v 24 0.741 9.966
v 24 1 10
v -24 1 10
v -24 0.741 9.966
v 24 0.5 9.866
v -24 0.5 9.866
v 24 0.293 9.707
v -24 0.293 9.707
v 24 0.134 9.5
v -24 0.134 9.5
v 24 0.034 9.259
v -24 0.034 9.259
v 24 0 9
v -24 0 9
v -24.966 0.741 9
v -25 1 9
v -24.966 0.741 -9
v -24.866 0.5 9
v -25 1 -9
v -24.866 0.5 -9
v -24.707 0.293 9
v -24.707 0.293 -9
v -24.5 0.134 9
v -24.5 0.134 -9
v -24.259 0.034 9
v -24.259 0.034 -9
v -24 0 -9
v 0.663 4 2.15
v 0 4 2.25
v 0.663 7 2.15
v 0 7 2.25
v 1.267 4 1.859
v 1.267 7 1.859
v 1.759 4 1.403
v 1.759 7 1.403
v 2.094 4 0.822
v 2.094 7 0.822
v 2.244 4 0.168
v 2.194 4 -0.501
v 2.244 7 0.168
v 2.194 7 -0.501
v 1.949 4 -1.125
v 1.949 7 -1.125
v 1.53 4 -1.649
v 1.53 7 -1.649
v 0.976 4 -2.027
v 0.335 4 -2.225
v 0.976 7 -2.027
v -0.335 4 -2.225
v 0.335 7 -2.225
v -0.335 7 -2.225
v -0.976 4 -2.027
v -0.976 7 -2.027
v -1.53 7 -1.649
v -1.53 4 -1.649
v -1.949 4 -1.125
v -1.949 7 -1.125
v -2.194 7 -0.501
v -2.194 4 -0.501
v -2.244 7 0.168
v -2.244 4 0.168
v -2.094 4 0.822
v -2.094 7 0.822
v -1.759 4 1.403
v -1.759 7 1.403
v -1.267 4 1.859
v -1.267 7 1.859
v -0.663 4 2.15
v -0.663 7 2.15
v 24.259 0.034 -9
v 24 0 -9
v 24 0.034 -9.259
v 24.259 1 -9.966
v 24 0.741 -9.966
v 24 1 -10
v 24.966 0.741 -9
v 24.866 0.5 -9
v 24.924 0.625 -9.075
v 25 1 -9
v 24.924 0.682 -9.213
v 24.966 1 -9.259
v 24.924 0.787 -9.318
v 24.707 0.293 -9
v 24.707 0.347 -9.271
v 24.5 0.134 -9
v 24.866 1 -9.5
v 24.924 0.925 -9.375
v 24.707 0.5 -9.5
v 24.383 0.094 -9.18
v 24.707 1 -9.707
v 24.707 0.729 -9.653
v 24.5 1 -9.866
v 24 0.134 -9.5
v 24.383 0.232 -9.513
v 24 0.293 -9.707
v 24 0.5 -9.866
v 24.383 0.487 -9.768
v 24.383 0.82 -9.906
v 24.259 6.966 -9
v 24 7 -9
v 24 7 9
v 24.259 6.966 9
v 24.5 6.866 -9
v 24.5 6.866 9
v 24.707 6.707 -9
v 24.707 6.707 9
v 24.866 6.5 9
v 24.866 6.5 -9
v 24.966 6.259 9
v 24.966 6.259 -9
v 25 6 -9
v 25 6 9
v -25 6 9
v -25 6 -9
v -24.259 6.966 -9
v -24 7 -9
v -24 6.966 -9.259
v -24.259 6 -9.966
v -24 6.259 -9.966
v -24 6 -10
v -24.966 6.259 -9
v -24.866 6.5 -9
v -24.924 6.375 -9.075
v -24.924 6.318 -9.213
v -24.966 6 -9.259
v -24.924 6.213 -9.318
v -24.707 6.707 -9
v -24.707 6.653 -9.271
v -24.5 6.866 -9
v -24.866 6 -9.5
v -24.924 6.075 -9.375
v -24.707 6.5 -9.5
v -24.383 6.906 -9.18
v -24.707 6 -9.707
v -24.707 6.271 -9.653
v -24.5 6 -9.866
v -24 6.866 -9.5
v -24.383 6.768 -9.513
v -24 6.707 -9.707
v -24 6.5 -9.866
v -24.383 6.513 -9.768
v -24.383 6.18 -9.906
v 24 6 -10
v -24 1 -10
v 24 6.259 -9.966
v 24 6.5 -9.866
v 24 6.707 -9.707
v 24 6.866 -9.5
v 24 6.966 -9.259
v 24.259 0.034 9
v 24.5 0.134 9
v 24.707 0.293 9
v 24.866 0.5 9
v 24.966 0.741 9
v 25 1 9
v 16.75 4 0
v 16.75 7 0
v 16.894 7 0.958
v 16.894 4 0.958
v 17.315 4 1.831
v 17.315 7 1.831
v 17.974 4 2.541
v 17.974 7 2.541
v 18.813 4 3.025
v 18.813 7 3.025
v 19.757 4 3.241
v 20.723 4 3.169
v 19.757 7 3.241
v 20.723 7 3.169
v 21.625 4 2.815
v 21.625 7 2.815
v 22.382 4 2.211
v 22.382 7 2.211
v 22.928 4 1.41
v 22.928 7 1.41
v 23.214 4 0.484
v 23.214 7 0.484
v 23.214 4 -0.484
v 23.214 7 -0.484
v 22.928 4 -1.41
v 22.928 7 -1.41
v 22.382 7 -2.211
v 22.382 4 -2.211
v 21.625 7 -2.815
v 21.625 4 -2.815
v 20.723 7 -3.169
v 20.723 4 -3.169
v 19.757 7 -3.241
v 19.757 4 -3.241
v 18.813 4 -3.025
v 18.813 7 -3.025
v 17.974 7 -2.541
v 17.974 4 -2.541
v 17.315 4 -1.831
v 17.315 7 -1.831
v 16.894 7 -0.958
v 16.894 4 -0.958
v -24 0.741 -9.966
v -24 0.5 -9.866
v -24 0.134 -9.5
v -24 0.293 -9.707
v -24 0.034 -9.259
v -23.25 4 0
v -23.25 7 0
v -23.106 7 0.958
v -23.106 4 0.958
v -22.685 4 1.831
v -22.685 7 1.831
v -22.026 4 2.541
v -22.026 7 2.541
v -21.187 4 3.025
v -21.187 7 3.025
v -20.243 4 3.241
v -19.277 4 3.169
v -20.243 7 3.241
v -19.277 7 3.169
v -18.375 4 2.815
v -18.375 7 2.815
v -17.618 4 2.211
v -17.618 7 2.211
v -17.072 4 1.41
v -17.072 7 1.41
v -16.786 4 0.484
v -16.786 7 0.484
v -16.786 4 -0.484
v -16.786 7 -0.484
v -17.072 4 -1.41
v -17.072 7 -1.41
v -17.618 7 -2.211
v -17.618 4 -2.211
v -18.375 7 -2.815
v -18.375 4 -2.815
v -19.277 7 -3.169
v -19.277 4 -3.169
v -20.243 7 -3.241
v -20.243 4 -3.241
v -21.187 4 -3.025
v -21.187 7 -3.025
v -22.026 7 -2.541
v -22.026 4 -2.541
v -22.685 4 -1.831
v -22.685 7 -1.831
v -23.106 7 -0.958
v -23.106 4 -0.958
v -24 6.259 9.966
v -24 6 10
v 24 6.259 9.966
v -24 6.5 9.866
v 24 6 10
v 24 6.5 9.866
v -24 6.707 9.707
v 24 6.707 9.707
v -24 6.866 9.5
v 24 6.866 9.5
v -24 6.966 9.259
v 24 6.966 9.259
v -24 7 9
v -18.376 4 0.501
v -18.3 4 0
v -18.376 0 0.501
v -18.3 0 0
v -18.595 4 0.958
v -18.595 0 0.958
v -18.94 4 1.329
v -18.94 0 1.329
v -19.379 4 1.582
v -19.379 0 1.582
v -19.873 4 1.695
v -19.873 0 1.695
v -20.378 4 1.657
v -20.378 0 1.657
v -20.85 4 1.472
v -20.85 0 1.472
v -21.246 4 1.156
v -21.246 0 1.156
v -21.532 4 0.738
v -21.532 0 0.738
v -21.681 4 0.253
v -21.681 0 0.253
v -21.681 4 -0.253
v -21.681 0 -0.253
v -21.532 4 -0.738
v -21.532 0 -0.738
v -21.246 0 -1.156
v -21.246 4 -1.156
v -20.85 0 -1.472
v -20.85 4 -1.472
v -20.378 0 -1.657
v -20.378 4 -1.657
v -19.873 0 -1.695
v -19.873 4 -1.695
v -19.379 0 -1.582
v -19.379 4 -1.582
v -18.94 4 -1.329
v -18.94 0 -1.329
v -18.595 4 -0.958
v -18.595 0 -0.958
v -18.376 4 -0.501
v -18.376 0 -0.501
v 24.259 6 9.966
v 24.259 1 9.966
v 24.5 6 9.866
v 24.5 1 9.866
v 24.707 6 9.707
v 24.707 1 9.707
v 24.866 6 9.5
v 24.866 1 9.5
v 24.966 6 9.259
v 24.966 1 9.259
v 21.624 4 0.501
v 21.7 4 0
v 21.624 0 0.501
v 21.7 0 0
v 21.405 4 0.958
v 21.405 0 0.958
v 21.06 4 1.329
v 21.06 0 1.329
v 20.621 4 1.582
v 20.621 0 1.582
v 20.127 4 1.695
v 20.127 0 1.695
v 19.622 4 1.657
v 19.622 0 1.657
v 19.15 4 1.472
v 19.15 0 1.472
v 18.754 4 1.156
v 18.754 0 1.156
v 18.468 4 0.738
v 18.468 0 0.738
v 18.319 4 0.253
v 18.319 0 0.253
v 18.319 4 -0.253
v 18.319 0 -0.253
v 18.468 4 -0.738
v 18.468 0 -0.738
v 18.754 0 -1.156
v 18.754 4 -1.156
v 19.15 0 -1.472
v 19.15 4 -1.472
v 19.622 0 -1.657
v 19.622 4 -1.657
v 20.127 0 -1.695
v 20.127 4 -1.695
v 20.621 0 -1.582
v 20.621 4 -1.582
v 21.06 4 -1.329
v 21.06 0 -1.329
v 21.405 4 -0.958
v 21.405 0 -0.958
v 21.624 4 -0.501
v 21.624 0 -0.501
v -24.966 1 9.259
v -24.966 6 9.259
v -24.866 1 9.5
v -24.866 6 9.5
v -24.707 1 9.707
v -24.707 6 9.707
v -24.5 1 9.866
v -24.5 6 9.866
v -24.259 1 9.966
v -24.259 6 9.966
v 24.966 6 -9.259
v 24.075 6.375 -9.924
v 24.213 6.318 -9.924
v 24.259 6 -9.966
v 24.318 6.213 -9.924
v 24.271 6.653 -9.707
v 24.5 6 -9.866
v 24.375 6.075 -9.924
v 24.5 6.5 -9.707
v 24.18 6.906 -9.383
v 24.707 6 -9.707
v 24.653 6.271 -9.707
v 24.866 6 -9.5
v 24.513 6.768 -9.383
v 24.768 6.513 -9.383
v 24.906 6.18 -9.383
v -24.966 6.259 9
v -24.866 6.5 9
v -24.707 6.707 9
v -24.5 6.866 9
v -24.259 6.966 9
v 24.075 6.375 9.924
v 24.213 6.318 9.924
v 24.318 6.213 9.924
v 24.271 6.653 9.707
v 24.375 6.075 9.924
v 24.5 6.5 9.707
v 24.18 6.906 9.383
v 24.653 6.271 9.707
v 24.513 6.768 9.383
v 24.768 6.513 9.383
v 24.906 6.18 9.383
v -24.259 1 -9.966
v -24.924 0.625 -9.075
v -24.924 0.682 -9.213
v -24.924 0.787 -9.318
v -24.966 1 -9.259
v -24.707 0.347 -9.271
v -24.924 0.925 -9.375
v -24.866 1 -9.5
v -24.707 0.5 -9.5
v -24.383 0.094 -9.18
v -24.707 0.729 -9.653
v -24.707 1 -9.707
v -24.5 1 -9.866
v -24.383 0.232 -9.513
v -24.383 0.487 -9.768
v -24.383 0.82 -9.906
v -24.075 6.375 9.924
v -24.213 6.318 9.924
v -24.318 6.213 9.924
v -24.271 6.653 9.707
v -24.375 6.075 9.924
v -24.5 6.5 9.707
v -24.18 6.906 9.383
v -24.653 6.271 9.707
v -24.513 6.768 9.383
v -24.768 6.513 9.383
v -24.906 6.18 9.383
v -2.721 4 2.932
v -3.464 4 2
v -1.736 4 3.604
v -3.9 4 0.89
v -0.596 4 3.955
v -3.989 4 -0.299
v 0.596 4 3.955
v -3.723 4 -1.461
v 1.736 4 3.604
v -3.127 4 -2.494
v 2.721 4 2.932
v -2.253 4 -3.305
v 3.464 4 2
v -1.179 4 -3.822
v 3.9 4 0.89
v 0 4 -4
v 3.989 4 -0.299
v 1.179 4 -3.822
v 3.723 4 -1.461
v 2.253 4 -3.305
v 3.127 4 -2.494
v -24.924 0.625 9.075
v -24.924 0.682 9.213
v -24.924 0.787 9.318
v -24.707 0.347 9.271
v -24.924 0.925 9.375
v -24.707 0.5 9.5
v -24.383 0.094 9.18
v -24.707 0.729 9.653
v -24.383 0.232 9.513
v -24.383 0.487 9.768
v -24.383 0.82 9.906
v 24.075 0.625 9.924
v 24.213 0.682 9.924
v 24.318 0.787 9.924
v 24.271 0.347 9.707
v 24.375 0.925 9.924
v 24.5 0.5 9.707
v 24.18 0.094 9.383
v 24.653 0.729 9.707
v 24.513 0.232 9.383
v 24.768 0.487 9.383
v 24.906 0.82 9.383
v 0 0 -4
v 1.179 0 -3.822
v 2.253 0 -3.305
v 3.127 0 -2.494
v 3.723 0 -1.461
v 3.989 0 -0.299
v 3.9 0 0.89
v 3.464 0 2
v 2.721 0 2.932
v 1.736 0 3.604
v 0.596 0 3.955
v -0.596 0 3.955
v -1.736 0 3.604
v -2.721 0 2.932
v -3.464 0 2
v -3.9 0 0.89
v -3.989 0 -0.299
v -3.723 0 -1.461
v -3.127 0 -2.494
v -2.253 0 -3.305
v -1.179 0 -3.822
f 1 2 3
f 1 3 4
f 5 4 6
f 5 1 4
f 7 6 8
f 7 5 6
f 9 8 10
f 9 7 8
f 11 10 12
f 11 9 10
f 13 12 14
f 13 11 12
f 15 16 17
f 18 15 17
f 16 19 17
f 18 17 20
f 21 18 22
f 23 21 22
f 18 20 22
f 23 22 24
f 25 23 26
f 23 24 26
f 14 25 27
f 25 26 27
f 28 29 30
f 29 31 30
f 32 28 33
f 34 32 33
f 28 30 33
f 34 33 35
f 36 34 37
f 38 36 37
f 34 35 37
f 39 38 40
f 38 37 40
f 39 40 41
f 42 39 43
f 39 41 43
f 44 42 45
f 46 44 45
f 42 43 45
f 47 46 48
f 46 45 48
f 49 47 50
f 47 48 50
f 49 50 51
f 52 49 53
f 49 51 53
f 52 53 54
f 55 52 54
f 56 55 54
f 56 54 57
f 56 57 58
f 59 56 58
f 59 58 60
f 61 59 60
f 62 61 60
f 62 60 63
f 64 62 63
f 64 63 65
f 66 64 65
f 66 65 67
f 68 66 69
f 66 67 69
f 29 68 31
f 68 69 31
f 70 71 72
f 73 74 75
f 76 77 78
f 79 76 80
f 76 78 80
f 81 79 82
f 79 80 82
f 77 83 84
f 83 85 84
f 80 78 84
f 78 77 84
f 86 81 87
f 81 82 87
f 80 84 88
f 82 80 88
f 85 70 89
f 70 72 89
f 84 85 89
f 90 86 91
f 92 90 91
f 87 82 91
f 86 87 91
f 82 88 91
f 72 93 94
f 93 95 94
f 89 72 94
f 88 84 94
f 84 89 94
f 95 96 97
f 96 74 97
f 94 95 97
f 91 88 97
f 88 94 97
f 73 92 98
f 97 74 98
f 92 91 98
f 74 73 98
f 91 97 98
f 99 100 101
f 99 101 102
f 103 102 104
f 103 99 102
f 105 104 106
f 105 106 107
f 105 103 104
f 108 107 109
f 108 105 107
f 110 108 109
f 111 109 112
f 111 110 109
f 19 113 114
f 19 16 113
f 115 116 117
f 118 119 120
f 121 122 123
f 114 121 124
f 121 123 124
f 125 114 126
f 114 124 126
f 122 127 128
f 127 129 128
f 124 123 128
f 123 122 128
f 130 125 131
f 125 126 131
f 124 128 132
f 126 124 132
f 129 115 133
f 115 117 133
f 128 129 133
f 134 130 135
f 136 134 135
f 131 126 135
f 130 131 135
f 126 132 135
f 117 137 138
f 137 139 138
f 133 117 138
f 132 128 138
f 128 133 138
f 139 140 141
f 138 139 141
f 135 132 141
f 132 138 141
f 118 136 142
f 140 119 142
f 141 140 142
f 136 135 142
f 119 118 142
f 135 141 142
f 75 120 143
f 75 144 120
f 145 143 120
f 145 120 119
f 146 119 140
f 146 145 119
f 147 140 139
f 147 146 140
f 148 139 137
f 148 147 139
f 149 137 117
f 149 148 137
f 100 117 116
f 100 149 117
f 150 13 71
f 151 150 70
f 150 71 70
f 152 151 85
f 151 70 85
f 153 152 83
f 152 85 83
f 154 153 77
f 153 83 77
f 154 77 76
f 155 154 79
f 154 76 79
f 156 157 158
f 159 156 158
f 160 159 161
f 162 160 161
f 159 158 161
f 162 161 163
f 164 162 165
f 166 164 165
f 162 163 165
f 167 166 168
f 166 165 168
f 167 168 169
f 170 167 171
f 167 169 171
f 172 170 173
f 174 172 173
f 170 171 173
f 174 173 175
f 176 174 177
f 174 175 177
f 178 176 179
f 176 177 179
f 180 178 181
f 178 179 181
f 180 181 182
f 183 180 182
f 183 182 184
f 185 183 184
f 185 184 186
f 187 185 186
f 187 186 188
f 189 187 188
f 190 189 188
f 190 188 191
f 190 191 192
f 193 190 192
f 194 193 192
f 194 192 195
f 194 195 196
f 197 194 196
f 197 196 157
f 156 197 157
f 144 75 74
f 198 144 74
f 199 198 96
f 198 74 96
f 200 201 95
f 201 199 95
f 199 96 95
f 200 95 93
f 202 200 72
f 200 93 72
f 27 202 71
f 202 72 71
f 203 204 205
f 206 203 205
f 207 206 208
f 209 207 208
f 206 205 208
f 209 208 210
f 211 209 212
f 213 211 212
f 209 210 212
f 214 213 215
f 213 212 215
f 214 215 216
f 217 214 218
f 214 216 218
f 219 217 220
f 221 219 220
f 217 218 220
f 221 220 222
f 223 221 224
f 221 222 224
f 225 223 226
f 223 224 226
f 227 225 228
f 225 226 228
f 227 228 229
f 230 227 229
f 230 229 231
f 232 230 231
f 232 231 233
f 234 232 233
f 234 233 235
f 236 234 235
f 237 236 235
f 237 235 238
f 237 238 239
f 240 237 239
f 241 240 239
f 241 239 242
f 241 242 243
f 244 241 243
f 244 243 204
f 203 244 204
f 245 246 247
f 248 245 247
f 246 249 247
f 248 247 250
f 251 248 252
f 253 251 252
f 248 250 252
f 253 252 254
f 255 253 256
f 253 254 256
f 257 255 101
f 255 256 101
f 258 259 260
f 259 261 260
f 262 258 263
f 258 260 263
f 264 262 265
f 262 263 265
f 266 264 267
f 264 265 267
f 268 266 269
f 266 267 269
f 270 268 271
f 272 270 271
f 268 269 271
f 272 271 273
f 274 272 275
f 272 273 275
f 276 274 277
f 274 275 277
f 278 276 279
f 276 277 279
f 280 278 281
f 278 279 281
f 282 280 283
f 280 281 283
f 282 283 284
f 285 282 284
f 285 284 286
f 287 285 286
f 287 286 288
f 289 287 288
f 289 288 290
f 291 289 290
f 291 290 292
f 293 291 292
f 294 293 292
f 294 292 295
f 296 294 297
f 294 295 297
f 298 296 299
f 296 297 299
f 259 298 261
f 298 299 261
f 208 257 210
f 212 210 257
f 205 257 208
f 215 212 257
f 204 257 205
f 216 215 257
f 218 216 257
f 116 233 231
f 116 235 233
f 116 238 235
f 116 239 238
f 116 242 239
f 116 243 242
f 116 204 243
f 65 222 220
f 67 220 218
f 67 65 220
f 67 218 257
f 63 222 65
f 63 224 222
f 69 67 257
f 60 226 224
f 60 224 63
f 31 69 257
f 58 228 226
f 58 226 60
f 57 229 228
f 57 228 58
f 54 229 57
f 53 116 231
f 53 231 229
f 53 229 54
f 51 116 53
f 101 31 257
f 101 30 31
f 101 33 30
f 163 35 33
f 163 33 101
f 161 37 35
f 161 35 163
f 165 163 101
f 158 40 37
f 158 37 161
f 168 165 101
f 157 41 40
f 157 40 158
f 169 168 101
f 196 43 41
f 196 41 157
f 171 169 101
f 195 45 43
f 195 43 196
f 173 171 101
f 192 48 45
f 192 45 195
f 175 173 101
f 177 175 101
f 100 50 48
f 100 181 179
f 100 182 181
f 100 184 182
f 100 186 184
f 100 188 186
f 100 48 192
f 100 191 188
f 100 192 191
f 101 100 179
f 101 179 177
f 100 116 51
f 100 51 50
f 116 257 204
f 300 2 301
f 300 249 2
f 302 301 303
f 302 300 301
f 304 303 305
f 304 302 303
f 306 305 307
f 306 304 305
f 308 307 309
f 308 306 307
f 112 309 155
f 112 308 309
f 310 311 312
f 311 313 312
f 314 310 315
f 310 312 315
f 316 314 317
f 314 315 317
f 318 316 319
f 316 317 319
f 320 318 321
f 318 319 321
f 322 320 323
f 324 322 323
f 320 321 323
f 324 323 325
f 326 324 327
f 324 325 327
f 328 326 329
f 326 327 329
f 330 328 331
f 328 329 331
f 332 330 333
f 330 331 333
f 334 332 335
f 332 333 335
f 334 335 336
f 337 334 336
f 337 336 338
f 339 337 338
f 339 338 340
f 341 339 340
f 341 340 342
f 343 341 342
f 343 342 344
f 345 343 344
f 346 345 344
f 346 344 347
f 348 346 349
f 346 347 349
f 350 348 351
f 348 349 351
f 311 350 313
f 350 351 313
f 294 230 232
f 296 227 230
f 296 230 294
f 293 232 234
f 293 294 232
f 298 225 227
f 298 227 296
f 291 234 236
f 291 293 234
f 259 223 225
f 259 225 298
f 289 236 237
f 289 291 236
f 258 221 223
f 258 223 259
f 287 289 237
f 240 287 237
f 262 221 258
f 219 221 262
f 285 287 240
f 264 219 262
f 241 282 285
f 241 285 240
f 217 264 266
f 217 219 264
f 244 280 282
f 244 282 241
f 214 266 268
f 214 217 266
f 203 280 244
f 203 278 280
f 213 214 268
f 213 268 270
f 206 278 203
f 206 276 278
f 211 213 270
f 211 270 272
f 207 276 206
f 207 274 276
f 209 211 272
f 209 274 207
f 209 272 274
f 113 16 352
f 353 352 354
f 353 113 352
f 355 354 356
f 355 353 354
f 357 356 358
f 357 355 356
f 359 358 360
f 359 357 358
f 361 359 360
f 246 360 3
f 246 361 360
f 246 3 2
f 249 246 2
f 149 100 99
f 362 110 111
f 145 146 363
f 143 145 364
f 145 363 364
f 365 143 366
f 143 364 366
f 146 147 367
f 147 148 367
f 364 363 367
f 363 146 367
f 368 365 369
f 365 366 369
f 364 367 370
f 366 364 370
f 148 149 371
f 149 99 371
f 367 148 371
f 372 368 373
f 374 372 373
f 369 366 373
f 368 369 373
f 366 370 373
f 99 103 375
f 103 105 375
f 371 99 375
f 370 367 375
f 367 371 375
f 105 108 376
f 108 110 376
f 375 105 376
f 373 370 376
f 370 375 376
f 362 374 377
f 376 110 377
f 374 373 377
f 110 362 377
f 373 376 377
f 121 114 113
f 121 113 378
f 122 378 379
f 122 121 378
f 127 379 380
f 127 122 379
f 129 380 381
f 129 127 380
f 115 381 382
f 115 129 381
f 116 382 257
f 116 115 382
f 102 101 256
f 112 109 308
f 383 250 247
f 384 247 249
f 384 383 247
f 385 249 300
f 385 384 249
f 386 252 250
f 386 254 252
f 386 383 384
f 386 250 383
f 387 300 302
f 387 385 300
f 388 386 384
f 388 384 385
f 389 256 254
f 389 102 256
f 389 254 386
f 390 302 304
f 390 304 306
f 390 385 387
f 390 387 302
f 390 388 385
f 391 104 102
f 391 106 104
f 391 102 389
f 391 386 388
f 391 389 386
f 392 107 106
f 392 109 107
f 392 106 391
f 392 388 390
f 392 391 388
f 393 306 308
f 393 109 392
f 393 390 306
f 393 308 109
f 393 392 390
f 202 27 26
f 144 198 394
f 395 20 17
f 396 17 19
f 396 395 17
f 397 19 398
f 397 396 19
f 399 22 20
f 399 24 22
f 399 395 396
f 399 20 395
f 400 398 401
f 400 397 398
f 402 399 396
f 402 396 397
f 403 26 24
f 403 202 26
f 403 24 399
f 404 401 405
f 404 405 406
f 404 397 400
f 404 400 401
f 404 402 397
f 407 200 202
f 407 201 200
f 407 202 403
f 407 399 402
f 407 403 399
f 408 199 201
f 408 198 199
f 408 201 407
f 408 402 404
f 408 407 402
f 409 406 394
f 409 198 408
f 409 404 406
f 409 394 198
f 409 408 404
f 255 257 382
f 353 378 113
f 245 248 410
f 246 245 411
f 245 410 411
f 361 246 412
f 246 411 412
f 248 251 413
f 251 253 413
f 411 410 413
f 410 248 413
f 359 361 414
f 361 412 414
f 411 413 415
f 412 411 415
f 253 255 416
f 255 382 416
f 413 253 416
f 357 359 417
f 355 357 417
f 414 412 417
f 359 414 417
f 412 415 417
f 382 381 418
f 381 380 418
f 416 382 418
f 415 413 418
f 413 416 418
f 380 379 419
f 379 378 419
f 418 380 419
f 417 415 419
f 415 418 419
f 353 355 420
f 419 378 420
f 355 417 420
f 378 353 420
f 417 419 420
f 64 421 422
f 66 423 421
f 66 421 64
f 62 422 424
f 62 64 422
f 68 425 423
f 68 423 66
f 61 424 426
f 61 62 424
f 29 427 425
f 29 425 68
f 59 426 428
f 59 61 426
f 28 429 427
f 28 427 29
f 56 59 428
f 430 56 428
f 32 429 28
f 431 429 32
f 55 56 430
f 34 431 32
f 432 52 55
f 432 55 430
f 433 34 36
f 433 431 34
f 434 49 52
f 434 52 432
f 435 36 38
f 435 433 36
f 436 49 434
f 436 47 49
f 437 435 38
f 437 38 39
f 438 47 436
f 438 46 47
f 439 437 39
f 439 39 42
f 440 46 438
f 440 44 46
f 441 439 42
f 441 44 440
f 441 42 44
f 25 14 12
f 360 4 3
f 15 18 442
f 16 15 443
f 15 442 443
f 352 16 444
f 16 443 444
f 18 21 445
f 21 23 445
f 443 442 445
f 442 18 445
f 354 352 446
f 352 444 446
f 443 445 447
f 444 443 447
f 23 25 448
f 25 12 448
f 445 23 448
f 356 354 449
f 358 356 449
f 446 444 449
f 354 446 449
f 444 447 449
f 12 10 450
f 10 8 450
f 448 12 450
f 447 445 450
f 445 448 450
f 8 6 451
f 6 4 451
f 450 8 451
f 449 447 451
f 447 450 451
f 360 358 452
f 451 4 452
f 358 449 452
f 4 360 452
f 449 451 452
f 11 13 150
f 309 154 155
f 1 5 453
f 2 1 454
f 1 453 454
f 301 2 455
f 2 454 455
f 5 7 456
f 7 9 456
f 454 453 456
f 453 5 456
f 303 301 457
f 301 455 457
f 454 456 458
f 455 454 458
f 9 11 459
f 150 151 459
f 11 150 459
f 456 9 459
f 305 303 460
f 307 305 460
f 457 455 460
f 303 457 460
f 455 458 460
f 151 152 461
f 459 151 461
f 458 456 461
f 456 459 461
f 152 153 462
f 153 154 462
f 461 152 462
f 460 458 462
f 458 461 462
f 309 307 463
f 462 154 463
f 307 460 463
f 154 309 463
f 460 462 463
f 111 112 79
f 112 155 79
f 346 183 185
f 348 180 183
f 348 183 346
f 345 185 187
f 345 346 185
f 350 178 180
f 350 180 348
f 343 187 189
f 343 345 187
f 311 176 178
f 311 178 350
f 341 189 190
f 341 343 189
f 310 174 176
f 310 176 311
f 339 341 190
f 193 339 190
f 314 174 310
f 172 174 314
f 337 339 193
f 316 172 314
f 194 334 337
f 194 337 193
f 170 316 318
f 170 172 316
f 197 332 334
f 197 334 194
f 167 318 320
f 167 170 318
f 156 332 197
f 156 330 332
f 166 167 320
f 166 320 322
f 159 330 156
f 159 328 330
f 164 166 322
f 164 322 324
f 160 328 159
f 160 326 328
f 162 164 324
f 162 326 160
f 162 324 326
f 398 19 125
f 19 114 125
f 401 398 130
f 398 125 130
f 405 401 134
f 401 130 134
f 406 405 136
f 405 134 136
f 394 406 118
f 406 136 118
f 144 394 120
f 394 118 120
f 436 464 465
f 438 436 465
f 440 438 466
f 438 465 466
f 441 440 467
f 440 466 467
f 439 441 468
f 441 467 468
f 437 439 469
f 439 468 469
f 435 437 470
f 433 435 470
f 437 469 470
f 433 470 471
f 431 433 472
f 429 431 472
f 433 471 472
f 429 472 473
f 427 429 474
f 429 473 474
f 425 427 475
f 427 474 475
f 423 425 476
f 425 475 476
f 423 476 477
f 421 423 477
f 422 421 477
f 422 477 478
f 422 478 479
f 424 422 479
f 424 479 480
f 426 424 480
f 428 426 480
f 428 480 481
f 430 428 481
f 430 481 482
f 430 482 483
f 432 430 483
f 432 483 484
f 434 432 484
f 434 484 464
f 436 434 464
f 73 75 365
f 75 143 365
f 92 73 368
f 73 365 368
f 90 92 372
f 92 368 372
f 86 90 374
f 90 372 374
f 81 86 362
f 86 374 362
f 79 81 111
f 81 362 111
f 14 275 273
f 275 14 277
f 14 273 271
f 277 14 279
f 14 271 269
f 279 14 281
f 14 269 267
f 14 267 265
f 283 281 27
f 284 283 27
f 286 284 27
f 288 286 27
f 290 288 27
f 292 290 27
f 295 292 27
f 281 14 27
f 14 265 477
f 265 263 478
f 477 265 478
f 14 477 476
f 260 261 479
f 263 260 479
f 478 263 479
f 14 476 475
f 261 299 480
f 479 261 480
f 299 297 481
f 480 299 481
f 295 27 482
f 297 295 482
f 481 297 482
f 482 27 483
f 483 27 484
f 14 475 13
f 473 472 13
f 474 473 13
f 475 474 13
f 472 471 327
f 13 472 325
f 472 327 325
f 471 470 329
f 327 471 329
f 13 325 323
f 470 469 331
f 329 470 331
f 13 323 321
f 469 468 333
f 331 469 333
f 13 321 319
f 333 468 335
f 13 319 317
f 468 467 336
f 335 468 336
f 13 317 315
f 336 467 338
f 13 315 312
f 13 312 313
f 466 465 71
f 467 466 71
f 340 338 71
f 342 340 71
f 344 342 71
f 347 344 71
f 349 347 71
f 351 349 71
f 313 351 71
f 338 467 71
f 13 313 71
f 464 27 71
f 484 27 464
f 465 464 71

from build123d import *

# Parameters (mm, degrees)
SKETCH1_W                      = 50
SKETCH1_H                      = 20
EXTRUDE1_DEPTH                 = 7
CBORE_FOR_M3_SHCS1_D           = 3.4
CBORE_FOR_M3_SHCS1_CBORE_D     = 6.5
CBORE_FOR_M3_SHCS1_CBORE_DEPTH = 3
FILLET1_R                      = 1
CBORE_FOR_M4_SHCS1_D           = 4.5
CBORE_FOR_M4_SHCS1_CBORE_D     = 8
CBORE_FOR_M4_SHCS1_CBORE_DEPTH = 4


with BuildPart() as part:
    # Sketch1 → Extrude1 (new body)
    with BuildSketch(Plane(origin=(0, 0, 0), x_dir=(1, 0, 0), z_dir=(0, 1, 0))):
        Rectangle(SKETCH1_W, SKETCH1_H)
    extrude(amount=EXTRUDE1_DEPTH)

    # CBORE for M3 SHCS1 (through all)
    with Locations(Plane(origin=(0, 7, 0), x_dir=(-1, 0, 0), z_dir=(0, 1, 0))):
        with Locations((20, 0), (-20, 0)):
            CounterBoreHole(CBORE_FOR_M3_SHCS1_D / 2, CBORE_FOR_M3_SHCS1_CBORE_D / 2, CBORE_FOR_M3_SHCS1_CBORE_DEPTH)

    # Fillet1
    fillet1_edges = [part.edges().sort_by_distance(p)[0] for p in [
        (25, 7, 0),
        (0, 7, -10),
        (-25, 7, 0),
        (0, 0, -10),
        (25, 0, 0),
        (0, 0, 10),
        (-25, 0, 0),
        (0, 7, 10),
        (-25, 3.5, -10),
        (25, 3.5, -10),
        (25, 3.5, 10),
        (-25, 3.5, 10),
    ]]
    fillet(fillet1_edges, radius=FILLET1_R)

    # CBORE for M4 SHCS1 (through all)
    with Locations(Plane(origin=(0, 0, 0), x_dir=(0, 0, -1), z_dir=(0, -1, 0))):
        with Locations((0, 0)):
            CounterBoreHole(CBORE_FOR_M4_SHCS1_D / 2, CBORE_FOR_M4_SHCS1_CBORE_D / 2, CBORE_FOR_M4_SHCS1_CBORE_DEPTH)


solid = part.part
